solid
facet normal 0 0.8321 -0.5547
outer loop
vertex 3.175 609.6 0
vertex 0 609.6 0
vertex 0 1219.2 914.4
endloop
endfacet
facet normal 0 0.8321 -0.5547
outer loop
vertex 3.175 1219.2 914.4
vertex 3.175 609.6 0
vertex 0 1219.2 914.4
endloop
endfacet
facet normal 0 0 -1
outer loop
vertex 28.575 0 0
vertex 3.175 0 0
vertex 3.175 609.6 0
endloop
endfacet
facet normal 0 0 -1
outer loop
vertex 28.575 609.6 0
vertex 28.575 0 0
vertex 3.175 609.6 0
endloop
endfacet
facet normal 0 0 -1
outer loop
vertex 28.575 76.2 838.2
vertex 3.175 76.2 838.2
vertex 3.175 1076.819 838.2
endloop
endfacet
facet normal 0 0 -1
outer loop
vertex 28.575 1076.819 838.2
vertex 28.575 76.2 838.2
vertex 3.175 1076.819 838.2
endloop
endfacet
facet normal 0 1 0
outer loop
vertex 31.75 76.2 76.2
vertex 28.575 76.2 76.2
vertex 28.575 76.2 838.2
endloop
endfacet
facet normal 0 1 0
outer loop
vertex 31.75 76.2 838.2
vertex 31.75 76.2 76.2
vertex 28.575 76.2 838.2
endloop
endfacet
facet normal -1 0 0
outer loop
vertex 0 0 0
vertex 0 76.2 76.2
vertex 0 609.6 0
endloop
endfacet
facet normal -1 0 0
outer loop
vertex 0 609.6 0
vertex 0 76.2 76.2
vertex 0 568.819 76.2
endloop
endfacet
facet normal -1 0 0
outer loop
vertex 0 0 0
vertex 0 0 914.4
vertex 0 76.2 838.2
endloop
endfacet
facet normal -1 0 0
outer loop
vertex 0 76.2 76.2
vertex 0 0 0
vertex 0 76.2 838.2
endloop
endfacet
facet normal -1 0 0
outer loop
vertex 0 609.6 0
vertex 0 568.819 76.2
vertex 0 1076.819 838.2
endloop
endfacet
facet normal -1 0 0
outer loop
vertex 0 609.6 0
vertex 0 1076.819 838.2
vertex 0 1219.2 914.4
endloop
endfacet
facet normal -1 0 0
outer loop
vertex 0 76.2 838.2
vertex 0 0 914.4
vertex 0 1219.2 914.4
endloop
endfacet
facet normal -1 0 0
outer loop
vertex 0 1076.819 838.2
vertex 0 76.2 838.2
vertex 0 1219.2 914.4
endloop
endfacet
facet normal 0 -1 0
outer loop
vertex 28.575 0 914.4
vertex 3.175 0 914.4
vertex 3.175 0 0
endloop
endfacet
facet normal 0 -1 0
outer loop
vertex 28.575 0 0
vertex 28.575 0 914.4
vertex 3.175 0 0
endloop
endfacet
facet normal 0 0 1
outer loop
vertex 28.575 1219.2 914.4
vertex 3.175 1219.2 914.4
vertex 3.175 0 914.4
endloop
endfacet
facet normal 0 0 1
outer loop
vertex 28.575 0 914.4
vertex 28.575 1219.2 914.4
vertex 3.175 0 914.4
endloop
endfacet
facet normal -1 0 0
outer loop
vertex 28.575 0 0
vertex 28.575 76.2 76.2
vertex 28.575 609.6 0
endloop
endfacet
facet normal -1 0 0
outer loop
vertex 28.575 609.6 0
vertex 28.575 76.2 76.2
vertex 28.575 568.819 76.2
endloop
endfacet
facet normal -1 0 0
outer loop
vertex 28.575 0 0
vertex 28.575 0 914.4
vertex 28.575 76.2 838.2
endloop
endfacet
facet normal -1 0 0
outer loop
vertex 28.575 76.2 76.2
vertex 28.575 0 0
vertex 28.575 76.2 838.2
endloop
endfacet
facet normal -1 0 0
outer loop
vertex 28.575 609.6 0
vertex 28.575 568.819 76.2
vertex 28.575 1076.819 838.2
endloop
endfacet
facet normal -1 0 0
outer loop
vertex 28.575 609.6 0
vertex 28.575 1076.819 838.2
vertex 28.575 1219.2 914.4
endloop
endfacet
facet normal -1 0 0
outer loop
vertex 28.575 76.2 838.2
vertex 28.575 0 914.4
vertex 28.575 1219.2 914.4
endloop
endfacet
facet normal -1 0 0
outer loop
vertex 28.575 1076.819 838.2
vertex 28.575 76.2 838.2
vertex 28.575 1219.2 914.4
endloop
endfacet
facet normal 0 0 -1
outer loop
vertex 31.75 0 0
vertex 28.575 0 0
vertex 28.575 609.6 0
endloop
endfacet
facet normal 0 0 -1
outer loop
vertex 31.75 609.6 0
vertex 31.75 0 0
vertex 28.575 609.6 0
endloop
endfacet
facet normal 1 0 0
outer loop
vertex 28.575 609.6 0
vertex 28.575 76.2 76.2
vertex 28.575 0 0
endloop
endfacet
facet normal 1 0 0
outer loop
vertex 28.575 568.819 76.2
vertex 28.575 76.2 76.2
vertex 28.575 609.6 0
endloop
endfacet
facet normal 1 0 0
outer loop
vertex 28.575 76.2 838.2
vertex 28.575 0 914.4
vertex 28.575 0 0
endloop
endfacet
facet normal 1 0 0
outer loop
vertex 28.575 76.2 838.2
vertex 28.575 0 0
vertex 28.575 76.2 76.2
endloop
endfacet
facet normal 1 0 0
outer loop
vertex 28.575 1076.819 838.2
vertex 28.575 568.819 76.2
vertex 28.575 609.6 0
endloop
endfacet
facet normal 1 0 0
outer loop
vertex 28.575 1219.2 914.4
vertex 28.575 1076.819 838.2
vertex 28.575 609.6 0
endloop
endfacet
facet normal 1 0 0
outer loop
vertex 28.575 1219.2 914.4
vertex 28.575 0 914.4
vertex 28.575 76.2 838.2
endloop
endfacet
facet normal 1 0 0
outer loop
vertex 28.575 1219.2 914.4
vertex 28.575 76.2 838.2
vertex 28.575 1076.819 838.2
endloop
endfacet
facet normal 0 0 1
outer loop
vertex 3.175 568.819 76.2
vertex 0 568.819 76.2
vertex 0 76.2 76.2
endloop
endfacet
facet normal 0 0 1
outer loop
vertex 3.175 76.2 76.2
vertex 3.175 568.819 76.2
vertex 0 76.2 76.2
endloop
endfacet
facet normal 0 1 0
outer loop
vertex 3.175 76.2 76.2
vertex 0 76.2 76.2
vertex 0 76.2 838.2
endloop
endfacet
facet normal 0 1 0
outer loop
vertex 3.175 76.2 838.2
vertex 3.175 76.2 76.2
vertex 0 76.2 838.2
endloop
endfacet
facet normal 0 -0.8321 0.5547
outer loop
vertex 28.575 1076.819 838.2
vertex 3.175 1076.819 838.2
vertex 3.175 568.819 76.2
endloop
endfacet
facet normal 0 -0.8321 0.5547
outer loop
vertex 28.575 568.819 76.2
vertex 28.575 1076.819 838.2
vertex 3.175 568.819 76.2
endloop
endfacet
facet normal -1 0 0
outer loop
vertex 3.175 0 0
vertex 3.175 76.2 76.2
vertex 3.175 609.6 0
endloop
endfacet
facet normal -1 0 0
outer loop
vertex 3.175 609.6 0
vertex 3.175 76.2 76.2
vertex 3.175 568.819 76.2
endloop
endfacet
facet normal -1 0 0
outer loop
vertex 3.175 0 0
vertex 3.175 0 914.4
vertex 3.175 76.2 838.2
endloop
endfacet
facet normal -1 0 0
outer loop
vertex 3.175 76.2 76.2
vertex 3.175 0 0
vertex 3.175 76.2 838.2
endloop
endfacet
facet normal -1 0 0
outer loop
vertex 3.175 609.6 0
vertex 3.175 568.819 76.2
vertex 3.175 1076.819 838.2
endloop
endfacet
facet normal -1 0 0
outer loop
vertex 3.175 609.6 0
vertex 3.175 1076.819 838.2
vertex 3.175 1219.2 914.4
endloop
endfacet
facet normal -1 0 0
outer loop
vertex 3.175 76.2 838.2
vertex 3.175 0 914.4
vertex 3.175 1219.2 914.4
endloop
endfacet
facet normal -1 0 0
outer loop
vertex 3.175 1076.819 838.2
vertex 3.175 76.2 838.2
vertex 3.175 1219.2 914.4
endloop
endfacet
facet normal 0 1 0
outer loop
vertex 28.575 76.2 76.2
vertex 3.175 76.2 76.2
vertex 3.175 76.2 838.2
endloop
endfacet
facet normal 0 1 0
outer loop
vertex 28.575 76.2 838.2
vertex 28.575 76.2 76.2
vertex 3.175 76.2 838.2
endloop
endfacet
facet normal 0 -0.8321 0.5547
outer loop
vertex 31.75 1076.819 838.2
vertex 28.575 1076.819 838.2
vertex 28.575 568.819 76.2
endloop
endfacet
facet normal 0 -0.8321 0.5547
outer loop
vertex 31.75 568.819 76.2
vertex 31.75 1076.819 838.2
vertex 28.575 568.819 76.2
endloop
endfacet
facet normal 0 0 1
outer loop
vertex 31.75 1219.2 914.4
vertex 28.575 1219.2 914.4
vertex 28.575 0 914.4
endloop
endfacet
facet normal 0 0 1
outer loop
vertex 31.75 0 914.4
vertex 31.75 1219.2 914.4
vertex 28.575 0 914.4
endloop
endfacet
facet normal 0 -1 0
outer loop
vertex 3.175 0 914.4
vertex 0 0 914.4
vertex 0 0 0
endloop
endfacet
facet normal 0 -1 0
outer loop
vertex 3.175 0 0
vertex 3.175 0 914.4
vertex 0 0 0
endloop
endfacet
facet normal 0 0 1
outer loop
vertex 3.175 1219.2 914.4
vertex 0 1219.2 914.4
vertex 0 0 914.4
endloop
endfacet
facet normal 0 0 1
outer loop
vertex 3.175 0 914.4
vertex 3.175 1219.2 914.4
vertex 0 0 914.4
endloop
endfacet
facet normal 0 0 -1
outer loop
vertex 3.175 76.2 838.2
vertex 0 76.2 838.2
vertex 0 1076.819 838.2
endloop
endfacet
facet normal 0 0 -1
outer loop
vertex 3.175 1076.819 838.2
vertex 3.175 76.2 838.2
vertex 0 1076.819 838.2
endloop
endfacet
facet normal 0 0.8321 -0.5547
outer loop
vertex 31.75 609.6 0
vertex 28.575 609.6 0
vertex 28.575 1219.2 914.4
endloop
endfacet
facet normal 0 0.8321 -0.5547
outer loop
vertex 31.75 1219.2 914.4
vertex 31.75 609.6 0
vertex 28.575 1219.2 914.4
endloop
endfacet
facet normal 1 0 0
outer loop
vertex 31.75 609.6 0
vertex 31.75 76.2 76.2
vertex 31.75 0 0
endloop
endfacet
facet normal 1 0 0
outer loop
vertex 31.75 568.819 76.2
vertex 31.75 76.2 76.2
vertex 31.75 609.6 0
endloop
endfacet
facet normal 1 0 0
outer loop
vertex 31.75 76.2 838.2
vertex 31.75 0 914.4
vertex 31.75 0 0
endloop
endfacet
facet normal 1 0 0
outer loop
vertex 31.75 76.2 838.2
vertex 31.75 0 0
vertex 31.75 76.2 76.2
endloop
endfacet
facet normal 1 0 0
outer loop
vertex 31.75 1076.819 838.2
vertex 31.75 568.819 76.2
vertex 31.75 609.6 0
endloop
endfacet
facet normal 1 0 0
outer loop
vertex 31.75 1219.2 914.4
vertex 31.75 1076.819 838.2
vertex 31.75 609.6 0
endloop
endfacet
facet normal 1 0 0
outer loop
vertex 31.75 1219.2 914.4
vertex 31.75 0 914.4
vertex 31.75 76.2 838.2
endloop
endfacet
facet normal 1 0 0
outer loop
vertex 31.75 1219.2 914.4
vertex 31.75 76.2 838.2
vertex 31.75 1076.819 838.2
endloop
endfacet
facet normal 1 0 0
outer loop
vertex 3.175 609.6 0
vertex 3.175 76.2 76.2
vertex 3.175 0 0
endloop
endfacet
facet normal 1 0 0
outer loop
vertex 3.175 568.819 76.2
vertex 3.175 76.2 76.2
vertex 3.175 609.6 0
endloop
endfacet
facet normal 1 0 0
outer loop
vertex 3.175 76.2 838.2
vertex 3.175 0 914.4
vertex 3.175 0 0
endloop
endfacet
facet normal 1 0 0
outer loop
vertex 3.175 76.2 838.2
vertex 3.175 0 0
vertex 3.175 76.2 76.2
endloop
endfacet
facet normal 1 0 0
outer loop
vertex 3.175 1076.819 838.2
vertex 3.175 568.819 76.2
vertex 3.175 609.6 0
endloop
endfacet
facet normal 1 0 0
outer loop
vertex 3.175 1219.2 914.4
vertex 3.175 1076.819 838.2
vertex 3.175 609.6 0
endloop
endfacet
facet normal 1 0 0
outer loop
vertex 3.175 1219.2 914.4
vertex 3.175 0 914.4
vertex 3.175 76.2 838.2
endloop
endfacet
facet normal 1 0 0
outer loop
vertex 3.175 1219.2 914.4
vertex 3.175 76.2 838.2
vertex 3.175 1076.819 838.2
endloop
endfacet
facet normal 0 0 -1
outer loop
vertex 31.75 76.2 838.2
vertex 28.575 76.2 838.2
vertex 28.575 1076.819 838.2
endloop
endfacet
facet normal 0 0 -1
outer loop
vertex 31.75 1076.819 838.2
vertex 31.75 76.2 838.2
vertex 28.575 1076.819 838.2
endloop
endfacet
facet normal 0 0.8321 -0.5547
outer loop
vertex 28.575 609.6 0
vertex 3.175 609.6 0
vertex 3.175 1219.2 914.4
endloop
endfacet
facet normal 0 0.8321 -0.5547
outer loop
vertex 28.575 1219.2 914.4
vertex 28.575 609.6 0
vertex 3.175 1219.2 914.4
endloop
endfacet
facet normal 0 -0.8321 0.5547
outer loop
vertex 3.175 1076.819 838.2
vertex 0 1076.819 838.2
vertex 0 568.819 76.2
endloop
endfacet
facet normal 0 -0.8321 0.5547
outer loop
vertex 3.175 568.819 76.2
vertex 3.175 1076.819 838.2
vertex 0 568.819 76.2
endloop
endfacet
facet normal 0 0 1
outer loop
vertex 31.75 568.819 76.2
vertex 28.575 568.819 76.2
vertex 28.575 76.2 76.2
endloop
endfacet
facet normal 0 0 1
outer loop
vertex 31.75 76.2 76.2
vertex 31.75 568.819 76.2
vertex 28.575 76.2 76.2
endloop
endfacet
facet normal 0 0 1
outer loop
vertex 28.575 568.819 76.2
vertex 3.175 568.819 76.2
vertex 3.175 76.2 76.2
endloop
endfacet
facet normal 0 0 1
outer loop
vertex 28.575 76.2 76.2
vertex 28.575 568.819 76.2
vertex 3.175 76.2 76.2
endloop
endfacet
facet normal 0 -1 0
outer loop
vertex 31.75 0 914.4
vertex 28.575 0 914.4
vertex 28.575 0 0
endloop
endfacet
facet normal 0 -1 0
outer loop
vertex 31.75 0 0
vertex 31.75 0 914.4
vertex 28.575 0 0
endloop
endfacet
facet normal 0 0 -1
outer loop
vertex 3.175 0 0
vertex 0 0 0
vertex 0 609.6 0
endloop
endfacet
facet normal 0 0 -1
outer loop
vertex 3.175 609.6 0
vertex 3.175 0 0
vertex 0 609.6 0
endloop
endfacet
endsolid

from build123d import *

# Parameters (mm, degrees)
F1_DEPTH = 3.175
F3_DEPTH = 25.4
F5_DEPTH = 3.175


with BuildPart() as f1:
    # F0 (on Right) → F1 (new body)
    with BuildSketch(Plane.YZ):
        Polygon((0, 914.4), (0, 0), (609.6, 0), (1219.2, 914.4), align=None)
        Polygon((76.2, 76.2), (76.2, 838.2), (1076.818998, 838.2), (568.818998, 76.2), align=None, mode=Mode.SUBTRACT)
    extrude(amount=F1_DEPTH)


with BuildPart() as f3:
    # F2 (on face) → F3 (new body)
    with BuildSketch(Plane.YZ.offset(3.175)):
        Polygon((1219.2, 914.4), (0, 914.4), (0, 0), (609.6, 0), align=None)
        Polygon((76.2, 76.2), (76.2, 838.2), (1076.818998, 838.2), (568.818998, 76.2), align=None, mode=Mode.SUBTRACT)
    extrude(amount=F3_DEPTH)


with BuildPart() as f5:
    # F4 (on face) → F5 (new body)
    with BuildSketch(Plane.YZ.offset(28.575)):
        Polygon((1219.2, 914.4), (0, 914.4), (0, 0), (609.6, 0), align=None)
        Polygon((76.2, 76.2), (76.2, 838.2), (1076.818998, 838.2), (568.818998, 76.2), align=None, mode=Mode.SUBTRACT)
    extrude(amount=F5_DEPTH)


solid = Compound([f1.part, f3.part, f5.part])
